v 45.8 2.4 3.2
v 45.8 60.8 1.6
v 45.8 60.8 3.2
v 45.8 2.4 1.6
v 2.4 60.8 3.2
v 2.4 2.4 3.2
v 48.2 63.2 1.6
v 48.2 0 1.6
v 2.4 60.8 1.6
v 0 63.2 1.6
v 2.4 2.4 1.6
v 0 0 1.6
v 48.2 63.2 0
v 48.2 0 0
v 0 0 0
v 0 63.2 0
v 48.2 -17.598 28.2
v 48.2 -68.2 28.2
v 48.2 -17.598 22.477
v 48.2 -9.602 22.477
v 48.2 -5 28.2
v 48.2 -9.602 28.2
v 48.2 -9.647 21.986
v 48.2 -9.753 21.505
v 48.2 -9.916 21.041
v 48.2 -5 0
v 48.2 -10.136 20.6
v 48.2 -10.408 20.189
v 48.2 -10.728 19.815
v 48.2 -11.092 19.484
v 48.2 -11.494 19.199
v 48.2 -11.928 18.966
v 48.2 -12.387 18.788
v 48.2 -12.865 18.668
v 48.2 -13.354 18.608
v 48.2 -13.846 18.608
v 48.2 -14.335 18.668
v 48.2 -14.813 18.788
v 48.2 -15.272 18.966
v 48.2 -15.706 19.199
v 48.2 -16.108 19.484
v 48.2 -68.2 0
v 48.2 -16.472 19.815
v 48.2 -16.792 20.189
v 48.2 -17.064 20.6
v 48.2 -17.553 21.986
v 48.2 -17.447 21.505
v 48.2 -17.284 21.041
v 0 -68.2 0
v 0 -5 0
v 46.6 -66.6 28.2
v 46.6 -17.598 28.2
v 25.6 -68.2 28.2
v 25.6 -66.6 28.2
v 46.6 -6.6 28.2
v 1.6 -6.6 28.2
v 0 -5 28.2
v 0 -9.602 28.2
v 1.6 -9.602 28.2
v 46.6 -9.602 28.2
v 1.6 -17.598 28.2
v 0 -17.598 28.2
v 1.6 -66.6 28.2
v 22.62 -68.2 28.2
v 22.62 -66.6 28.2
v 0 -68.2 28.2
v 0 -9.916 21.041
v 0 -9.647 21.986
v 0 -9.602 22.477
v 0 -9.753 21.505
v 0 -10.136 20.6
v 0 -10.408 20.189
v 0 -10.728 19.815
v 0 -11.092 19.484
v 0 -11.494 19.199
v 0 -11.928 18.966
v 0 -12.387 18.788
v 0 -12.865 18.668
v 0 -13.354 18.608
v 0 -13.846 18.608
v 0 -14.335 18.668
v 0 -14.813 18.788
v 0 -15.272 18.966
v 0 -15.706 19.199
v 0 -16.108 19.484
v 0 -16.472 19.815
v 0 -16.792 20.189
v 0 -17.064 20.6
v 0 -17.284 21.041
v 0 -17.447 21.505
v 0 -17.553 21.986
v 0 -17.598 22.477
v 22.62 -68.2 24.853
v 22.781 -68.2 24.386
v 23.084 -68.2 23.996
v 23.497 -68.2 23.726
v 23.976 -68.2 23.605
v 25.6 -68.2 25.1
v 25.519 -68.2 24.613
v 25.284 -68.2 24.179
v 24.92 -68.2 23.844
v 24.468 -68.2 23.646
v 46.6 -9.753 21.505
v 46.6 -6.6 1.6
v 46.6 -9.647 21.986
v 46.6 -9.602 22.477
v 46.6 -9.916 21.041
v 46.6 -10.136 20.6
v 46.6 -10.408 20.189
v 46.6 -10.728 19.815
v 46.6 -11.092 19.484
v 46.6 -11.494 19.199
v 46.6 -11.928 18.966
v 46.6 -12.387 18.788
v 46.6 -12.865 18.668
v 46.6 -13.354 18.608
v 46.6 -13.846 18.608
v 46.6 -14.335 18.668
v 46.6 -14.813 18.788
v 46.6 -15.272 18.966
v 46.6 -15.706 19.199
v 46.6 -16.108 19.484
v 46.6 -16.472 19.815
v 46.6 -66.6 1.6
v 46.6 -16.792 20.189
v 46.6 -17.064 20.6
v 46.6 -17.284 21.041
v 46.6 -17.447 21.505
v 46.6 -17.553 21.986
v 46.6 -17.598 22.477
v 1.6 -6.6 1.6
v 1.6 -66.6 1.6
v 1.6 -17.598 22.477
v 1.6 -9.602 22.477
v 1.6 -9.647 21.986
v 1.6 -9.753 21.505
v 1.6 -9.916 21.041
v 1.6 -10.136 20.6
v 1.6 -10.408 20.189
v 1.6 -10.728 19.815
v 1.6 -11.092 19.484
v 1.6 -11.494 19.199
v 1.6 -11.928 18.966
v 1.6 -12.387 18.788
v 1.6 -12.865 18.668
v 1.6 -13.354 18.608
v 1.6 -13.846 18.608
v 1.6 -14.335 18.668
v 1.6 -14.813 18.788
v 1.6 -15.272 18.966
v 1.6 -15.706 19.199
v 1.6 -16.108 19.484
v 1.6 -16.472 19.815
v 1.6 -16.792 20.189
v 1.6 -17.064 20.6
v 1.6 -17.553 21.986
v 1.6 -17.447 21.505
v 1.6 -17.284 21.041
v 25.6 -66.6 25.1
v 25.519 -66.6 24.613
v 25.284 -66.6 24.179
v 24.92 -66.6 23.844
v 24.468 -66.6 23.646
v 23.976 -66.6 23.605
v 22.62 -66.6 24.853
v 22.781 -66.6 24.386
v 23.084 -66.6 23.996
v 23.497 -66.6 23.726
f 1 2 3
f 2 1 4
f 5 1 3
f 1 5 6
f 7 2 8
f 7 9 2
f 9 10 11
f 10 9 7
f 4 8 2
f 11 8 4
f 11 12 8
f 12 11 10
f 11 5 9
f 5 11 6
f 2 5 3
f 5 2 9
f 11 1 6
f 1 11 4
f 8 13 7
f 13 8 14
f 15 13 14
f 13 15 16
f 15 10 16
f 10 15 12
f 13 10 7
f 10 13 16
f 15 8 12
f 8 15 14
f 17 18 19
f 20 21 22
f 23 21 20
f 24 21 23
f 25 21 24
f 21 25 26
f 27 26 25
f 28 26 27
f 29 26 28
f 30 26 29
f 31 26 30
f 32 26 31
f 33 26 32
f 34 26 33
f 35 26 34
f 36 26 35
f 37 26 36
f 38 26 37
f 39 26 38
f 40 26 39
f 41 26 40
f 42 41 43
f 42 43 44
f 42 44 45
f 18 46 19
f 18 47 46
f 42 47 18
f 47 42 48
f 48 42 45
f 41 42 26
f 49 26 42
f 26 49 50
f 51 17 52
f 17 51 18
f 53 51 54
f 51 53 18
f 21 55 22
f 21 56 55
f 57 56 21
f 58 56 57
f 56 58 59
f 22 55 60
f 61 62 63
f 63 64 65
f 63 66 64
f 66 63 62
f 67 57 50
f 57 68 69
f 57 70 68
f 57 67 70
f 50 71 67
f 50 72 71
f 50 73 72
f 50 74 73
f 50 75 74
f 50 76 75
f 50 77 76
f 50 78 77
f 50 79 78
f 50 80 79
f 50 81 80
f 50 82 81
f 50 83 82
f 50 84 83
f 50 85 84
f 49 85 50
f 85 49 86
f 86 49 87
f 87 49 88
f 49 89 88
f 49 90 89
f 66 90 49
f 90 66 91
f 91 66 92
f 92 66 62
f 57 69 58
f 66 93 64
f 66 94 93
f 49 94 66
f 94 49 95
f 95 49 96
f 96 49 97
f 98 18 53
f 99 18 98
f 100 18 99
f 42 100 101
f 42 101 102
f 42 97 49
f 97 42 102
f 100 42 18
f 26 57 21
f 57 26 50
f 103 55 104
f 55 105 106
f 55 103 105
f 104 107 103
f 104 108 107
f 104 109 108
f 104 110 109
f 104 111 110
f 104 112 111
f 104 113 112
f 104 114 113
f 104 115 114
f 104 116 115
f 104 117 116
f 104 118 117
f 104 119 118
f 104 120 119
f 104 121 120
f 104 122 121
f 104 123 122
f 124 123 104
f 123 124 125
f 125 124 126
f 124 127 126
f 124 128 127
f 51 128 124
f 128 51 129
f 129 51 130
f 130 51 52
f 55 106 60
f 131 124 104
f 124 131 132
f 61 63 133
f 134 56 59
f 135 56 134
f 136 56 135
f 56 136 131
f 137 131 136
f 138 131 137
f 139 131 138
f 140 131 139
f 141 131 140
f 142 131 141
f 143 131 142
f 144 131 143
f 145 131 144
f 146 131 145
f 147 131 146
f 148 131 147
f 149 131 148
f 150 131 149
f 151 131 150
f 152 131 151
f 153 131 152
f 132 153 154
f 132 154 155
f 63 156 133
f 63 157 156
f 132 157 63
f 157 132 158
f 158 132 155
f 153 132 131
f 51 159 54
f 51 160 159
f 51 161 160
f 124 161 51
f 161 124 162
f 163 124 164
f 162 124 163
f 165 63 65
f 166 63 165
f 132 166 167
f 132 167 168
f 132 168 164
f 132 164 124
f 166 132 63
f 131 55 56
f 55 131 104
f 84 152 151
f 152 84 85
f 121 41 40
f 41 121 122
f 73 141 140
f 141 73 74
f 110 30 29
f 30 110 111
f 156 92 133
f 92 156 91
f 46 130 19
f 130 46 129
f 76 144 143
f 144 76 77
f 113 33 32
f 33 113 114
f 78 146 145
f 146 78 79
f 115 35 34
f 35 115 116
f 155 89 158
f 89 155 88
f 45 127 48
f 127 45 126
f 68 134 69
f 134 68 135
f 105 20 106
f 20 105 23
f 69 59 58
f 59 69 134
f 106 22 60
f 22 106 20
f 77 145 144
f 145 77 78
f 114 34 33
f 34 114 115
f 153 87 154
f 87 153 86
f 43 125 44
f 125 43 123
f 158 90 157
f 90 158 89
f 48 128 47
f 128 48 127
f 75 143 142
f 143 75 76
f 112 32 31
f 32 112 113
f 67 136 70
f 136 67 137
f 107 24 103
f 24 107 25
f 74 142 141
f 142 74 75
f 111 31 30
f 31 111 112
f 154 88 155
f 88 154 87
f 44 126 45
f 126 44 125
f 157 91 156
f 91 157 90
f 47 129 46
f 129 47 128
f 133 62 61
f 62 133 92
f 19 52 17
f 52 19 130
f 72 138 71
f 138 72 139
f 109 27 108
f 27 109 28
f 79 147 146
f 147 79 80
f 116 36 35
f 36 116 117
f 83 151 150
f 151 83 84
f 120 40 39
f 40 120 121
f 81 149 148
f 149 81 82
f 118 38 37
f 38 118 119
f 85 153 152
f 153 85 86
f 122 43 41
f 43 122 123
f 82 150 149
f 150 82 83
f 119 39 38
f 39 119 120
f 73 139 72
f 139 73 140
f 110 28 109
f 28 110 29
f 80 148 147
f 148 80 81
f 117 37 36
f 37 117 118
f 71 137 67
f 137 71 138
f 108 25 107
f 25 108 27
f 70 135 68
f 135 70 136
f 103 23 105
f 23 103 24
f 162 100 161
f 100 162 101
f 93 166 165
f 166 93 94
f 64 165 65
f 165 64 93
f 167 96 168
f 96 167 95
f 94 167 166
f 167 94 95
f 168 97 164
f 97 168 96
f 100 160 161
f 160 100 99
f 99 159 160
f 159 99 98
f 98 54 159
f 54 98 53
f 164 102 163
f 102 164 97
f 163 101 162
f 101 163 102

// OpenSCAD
$fa=1;
$fs=0.5;
wall=1.6;
space=0.8;

module bottom()
{
  translate(wall*[1,1,1] + space*[1,1,0])
    cube([45-2*space, 60-2*space, wall]);
  cube([45+2*wall, 60+2*wall, wall]);
}

module cover()
{
  translate([0, 0, 25+2*wall])
    rotate([180, 0, 0])
      difference()
      {
        cube([45+2*wall, 60+2*wall, 25+2*wall]);
        translate(wall*[1,1,0])
          cube([45, 60, 25+wall]);
        translate([-5, 8/2+wall+3, wall+8])
          hull()
            for(dz=[0, -10])
              translate([0, 0, dz-8/2])
                rotate([0, 90, 0])
                  cylinder(r=8/2, h=60);
        translate([(45+2*wall)/2, 60, wall+3])
          hull()
            for(dz=[0, -10])
              translate([0, 0, dz-3/2])
                rotate([-90, 0, 0])
                  cylinder(r=3/2, h=4*wall);
      }
}


bottom();
%translate([0, 0, 25+2*wall+wall])
  rotate([180, 0, 0])
    cover();

translate([0, -5, 0])
  cover();
